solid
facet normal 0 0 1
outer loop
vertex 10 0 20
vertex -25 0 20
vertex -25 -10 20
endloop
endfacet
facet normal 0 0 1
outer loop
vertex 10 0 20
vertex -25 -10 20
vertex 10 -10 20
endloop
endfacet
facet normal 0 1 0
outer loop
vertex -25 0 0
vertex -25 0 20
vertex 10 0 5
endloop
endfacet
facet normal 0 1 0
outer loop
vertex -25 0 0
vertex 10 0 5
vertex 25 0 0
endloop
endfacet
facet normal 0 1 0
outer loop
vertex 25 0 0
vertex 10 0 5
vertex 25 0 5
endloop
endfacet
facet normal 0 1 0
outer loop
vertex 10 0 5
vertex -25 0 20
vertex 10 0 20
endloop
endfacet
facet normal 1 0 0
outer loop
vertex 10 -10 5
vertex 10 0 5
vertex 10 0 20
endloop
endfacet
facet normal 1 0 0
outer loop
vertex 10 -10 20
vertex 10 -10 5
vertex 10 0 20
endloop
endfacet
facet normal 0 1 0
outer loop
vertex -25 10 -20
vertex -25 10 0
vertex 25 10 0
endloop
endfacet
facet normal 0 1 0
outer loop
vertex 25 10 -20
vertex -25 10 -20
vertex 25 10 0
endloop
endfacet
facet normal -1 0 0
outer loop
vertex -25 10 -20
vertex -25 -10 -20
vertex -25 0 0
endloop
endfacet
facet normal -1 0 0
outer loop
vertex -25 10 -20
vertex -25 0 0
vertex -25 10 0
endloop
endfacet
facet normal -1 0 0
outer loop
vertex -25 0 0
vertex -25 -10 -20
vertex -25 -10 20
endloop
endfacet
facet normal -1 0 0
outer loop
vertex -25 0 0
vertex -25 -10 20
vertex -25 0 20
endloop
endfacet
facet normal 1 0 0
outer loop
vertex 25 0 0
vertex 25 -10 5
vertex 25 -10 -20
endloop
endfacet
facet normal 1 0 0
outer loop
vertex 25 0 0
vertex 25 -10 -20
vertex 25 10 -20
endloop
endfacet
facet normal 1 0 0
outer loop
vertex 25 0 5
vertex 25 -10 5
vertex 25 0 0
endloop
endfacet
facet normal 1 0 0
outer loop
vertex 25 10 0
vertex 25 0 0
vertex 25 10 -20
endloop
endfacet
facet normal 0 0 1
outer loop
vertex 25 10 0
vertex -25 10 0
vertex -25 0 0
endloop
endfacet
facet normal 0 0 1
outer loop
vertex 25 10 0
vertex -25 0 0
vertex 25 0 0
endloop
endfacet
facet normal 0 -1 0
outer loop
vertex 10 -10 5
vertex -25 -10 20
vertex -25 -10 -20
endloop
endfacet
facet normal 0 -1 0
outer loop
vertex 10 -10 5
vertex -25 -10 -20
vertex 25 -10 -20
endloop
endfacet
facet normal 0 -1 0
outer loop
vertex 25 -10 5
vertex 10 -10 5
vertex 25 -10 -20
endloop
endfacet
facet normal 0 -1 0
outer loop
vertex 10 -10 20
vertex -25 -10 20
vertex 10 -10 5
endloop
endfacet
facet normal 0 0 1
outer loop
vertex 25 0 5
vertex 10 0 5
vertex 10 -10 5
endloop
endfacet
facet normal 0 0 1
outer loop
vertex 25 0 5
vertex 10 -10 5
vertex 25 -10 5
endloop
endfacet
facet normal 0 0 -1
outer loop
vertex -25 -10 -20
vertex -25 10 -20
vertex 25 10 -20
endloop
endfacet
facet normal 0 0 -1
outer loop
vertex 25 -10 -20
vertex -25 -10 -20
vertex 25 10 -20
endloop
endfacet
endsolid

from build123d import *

# Parameters (mm, degrees)
F0_W     = 50
F0_H     = 40
F1_DEPTH = 10
F2_W     = 15
F2_H     = 15
F3_DEPTH = 10.001
F4_W     = 50
F4_H     = 10
F5_DEPTH = 20


with BuildPart() as f1:
    # F0 (on Front) → F1 (new body)
    with BuildSketch(Plane.XZ):
        Rectangle(F0_W, F0_H)
    extrude(amount=F1_DEPTH)

    # F2 (on Front) → F3 (cut, through all)
    with BuildSketch(Plane.XZ):
        with Locations((17.5, 12.5)):
            Rectangle(F2_W, F2_H)
    extrude(amount=F3_DEPTH, mode=Mode.SUBTRACT)

    # F4 (on Top) → F5 (join)
    with BuildSketch(Plane.XY):
        with Locations((0, 5)):
            Rectangle(F4_W, F4_H)
    extrude(amount=-F5_DEPTH)


solid = f1.part
